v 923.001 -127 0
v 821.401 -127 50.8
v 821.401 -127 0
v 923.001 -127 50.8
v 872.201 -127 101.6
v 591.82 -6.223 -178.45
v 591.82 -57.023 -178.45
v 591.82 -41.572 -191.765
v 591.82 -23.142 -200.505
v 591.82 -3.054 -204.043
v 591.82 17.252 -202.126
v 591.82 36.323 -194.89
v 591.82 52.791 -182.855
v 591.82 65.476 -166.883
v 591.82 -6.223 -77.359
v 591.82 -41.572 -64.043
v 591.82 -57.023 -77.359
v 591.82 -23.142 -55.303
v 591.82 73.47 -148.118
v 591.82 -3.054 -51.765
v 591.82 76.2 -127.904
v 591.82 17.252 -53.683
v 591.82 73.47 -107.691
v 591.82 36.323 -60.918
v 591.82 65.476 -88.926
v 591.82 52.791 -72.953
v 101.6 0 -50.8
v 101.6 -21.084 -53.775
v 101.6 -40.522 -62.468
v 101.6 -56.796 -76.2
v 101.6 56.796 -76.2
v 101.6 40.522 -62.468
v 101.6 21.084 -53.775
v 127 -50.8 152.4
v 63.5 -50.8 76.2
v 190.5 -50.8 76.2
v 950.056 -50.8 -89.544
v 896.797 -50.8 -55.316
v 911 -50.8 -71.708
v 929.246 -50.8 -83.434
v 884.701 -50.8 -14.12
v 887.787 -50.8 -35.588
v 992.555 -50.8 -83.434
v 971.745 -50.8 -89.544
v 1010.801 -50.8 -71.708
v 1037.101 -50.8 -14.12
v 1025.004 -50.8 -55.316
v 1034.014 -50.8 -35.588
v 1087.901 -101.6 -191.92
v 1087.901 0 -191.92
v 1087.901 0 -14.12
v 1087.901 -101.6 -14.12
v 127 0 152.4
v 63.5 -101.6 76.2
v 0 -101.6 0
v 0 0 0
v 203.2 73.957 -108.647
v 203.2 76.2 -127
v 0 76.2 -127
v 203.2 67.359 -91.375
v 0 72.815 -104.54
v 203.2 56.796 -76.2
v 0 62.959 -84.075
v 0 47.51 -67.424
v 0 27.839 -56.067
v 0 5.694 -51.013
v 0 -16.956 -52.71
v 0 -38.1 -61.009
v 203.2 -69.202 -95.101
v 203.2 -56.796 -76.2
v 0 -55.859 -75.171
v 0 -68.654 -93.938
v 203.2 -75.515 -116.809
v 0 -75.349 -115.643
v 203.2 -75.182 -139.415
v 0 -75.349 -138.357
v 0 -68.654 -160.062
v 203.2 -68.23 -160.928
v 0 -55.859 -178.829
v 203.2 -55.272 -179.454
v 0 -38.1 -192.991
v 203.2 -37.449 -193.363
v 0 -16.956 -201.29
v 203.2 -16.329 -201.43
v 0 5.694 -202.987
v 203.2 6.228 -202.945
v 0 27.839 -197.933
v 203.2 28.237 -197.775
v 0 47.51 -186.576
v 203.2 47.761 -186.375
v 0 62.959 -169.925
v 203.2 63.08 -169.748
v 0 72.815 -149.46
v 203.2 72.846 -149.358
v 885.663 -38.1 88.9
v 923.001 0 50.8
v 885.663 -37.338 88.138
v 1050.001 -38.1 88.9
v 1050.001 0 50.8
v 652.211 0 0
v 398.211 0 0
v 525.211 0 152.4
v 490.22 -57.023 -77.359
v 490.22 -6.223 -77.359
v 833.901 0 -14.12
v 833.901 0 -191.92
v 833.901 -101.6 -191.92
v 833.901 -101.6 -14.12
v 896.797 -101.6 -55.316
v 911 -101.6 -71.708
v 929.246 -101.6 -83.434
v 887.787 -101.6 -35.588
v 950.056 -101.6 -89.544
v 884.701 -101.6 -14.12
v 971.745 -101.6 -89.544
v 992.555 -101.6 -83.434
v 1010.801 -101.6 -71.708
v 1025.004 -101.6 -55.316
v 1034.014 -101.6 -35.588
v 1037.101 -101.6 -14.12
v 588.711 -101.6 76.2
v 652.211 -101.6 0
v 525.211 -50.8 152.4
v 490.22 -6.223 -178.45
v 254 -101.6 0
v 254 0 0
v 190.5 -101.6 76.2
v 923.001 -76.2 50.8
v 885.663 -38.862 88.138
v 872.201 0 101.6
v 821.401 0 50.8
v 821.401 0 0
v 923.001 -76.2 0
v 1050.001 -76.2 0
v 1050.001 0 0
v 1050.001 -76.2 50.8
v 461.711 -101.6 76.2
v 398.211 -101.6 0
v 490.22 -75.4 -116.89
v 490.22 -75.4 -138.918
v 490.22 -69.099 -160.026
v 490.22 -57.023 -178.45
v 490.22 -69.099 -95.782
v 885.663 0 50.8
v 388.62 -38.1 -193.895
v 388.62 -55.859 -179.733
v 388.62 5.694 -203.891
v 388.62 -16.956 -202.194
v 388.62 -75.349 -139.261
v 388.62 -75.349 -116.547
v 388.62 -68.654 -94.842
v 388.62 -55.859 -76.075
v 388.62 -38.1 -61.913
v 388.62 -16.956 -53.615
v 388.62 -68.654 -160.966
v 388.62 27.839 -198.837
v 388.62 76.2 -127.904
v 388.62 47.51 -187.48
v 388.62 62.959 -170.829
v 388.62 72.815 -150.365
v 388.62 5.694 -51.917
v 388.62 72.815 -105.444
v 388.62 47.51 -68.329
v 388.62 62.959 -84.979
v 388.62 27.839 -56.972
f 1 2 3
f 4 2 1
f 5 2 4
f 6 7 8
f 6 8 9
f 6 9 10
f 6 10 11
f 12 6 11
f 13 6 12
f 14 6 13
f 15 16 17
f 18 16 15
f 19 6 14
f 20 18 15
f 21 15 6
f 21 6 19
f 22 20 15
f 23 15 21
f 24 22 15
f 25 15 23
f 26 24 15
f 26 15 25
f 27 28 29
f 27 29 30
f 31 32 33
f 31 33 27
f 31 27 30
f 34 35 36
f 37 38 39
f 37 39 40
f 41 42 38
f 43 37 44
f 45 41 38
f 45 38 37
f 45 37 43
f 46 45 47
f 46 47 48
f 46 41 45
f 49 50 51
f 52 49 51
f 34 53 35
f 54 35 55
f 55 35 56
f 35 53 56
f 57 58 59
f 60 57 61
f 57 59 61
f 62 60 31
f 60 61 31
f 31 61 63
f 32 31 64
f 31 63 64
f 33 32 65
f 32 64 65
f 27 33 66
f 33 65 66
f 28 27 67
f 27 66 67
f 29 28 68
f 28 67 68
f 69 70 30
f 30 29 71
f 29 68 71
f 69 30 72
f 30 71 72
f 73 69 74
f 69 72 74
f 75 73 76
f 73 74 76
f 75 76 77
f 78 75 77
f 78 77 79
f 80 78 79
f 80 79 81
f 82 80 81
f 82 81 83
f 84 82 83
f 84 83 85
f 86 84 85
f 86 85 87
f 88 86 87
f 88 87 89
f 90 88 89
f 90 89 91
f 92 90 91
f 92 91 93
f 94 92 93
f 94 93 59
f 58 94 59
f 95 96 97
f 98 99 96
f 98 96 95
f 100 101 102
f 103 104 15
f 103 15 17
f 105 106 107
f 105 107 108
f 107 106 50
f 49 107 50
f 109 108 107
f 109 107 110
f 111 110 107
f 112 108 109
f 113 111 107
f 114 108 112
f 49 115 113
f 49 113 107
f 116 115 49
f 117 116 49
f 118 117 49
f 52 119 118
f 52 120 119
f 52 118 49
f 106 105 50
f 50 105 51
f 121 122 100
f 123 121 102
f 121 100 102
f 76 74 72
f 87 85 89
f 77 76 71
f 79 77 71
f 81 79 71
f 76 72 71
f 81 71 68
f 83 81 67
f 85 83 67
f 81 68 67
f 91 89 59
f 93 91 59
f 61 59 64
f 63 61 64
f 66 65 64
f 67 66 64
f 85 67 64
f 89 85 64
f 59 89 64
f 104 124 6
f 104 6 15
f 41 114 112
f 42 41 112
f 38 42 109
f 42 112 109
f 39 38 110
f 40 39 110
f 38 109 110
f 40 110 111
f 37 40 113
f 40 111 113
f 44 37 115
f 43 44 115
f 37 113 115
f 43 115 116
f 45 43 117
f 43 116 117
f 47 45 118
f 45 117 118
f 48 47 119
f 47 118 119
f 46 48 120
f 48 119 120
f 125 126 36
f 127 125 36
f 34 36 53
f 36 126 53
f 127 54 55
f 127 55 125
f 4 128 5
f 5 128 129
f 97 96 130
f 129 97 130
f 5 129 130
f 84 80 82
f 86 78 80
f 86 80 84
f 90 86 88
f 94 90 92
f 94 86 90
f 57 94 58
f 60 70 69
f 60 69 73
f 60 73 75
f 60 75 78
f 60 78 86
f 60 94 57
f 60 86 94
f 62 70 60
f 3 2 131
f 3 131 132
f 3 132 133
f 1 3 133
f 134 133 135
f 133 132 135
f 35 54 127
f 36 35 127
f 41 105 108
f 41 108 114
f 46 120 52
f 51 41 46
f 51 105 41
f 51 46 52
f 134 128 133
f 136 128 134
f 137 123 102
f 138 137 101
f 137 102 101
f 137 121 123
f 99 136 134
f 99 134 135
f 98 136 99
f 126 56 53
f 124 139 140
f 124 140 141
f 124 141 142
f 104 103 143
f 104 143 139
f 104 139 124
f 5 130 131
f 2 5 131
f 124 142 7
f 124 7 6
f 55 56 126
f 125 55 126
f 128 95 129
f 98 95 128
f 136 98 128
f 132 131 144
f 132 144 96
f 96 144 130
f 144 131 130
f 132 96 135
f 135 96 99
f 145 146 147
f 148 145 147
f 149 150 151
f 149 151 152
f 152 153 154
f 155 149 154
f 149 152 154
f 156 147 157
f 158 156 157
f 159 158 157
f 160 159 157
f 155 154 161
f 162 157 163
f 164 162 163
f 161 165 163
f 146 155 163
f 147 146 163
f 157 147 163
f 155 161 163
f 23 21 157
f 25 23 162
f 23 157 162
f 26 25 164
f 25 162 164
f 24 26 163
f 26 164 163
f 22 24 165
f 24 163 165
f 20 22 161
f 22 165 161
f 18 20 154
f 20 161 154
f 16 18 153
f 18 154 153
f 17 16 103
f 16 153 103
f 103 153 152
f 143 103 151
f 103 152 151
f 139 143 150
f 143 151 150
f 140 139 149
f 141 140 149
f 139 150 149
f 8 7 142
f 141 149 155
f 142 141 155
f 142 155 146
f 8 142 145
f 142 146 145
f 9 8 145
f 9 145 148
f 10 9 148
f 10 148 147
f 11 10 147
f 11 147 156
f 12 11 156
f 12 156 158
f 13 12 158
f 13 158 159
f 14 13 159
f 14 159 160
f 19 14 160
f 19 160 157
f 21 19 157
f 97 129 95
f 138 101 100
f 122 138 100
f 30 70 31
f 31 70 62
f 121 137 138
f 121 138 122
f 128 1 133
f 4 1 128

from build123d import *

# Parameters (mm, degrees)
F1_DEPTH  = 101.6
F3_DEPTH  = 50.8
F5_DEPTH  = 101.6
F7_DEPTH  = 101.6
F11_DEPTH = 63.5
F12_W     = 127
F12_H     = 50.8
F13_DEPTH = 127
F15_DEPTH = 164.338
F16_W     = 127
F16_H     = 50.8
F17_DEPTH = 50.8
F18_R     = 76.2
F19_DEPTH = 203.2
F21_DEPTH = 101.6
F23_R     = 76.2
F24_DEPTH = 203.2
F26_DEPTH = 101.6
F27_W     = 254
F27_H     = 177.8
F28_DEPTH = 101.6
F30_DEPTH = 50.8


with BuildPart() as f1:
    # F0 (on Front) → F1 (new body)
    with BuildSketch(Plane.XZ):
        Polygon((63.5, 76.2), (0, 0), (254, 0), (190.5, 76.2), (127, 76.2), align=None)
        Polygon((127, 152.4), (63.5, 76.2), (127, 76.2), (190.5, 76.2), align=None)
    extrude(amount=F1_DEPTH)

    # F2 (on face) → F3 (cut)
    with BuildSketch(Plane.XZ.offset(101.6)):
        Polygon((63.5, 76.2), (127, 76.2), (190.5, 76.2), (127, 152.4), align=None)
    extrude(amount=-F3_DEPTH, mode=Mode.SUBTRACT)

    # F6 (on face) → F7 (cut)
    with BuildSketch(Plane(origin=(384.9111806809, 0, 320.759317234), x_dir=(0, 1, 0), z_dir=(0.7682212796, 0, 0.6401843997))):
        Polygon((-101.6, -219.1547171438), (-101.6, -318.3448880279), (-50.8, -219.1547171438), align=None)
    extrude(amount=F7_DEPTH, mode=Mode.SUBTRACT)


with BuildPart() as f5:
    # F4 (on Front) → F5 (new body)
    with BuildSketch(Plane.XZ):
        Polygon((525.2106117092, 152.4), (398.2106117092, 0), (652.2106117092, 0), align=None)
    extrude(amount=F5_DEPTH)

    # F10 (on 3pt) → F11 (cut, symmetric)
    with BuildSketch(Plane.YZ.offset(525.2106117092)):
        Polygon((-50.8, 152.4), (-101.6, 152.4), (-101.6, 76.2), align=None)
    extrude(amount=F11_DEPTH, both=True, mode=Mode.SUBTRACT)


with BuildPart() as f13:
    # F12 (on Front) → F13 (new body)
    with BuildSketch(Plane.XZ):
        Polygon((821.4010382175, 0), (923.0010382175, 0), (923.0010382175, 50.8), (872.2010382175, 101.6), (821.4010382175, 50.8), align=None)
        with Locations((986.5010382175, 25.4)):
            Rectangle(F12_W, F12_H)
    extrude(amount=F13_DEPTH)

    # F14 (on face) → F15 (join)
    with BuildSketch(Plane.YZ.offset(1050.0010382175)):
        Polygon((-38.1, 88.9), (-76.2, 50.8), (0, 50.8), align=None)
    extrude(amount=-F15_DEPTH)

    # F16 (on face) → F17 (cut)
    with BuildSketch(Plane.XZ.offset(127)):
        with Locations((986.5010382175, 25.4)):
            Rectangle(F16_W, F16_H)
    extrude(amount=-F17_DEPTH, mode=Mode.SUBTRACT)


with BuildPart() as f19:
    # F18 (on Right) → F19 (new body)
    with BuildSketch(Plane.YZ):
        with Locations((0, -127)):
            Circle(F18_R)
    extrude(amount=F19_DEPTH)

    # F20 (on face) → F21 (cut)
    with BuildSketch(Plane.YZ.offset(203.2)):
        with BuildLine():
            Line((-56.7961266285, -76.2), (0, -76.2))
            Line((0, -76.2), (0, -50.8))
            ThreePointArc((0, -50.8), (-31.1085197333, -57.4392351968), (-56.7961266285, -76.2))
        make_face()
        with BuildLine():
            Line((0, -50.8), (0, -76.2))
            Line((0, -76.2), (56.7961266285, -76.2))
            ThreePointArc((56.7961266285, -76.2), (31.1085197333, -57.4392351968), (0, -50.8))
        make_face()
    extrude(amount=-F21_DEPTH, mode=Mode.SUBTRACT)


with BuildPart() as f24:
    # F23 (on offset) → F24 (new body)
    with BuildSketch(Plane.YZ.offset(388.62)):
        with Locations((0, -127.9042363167)):
            Circle(F23_R)
    extrude(amount=F24_DEPTH)

    # F25 (on face) → F26 (cut)
    with BuildSketch(Plane.YZ.offset(591.82)):
        with BuildLine():
            Line((-57.0227449789, -178.4497262745), (-6.2227449789, -178.4497262745))
            Line((-6.2227449789, -178.4497262745), (-6.2227449789, -77.3587463589))
            Line((-6.2227449789, -77.3587463589), (-57.0227449789, -77.3587463589))
            ThreePointArc((-57.0227449789, -77.3587463589), (-76.2, -127.9042363167), (-57.0227449789, -178.4497262745))
        make_face()
    extrude(amount=-F26_DEPTH, mode=Mode.SUBTRACT)


with BuildPart() as f28:
    # F27 (on Front) → F28 (new body)
    with BuildSketch(Plane.XZ):
        with Locations((960.9007537365, -103.0196546078)):
            Rectangle(F27_W, F27_H)
    extrude(amount=F28_DEPTH)

    # F29 (on face) → F30 (cut)
    with BuildSketch(Plane.XZ.offset(101.6)):
        with BuildLine():
            ThreePointArc((884.7007537365, -14.1196546078), (960.9007537365, -90.3196546078), (1037.1007537365, -14.1196546078))
            Line((1037.1007537365, -14.1196546078), (884.7007537365, -14.1196546078))
        make_face()
    extrude(amount=-F30_DEPTH, mode=Mode.SUBTRACT)


solid = Compound([f1.part, f5.part, f13.part, f19.part, f24.part, f28.part])
